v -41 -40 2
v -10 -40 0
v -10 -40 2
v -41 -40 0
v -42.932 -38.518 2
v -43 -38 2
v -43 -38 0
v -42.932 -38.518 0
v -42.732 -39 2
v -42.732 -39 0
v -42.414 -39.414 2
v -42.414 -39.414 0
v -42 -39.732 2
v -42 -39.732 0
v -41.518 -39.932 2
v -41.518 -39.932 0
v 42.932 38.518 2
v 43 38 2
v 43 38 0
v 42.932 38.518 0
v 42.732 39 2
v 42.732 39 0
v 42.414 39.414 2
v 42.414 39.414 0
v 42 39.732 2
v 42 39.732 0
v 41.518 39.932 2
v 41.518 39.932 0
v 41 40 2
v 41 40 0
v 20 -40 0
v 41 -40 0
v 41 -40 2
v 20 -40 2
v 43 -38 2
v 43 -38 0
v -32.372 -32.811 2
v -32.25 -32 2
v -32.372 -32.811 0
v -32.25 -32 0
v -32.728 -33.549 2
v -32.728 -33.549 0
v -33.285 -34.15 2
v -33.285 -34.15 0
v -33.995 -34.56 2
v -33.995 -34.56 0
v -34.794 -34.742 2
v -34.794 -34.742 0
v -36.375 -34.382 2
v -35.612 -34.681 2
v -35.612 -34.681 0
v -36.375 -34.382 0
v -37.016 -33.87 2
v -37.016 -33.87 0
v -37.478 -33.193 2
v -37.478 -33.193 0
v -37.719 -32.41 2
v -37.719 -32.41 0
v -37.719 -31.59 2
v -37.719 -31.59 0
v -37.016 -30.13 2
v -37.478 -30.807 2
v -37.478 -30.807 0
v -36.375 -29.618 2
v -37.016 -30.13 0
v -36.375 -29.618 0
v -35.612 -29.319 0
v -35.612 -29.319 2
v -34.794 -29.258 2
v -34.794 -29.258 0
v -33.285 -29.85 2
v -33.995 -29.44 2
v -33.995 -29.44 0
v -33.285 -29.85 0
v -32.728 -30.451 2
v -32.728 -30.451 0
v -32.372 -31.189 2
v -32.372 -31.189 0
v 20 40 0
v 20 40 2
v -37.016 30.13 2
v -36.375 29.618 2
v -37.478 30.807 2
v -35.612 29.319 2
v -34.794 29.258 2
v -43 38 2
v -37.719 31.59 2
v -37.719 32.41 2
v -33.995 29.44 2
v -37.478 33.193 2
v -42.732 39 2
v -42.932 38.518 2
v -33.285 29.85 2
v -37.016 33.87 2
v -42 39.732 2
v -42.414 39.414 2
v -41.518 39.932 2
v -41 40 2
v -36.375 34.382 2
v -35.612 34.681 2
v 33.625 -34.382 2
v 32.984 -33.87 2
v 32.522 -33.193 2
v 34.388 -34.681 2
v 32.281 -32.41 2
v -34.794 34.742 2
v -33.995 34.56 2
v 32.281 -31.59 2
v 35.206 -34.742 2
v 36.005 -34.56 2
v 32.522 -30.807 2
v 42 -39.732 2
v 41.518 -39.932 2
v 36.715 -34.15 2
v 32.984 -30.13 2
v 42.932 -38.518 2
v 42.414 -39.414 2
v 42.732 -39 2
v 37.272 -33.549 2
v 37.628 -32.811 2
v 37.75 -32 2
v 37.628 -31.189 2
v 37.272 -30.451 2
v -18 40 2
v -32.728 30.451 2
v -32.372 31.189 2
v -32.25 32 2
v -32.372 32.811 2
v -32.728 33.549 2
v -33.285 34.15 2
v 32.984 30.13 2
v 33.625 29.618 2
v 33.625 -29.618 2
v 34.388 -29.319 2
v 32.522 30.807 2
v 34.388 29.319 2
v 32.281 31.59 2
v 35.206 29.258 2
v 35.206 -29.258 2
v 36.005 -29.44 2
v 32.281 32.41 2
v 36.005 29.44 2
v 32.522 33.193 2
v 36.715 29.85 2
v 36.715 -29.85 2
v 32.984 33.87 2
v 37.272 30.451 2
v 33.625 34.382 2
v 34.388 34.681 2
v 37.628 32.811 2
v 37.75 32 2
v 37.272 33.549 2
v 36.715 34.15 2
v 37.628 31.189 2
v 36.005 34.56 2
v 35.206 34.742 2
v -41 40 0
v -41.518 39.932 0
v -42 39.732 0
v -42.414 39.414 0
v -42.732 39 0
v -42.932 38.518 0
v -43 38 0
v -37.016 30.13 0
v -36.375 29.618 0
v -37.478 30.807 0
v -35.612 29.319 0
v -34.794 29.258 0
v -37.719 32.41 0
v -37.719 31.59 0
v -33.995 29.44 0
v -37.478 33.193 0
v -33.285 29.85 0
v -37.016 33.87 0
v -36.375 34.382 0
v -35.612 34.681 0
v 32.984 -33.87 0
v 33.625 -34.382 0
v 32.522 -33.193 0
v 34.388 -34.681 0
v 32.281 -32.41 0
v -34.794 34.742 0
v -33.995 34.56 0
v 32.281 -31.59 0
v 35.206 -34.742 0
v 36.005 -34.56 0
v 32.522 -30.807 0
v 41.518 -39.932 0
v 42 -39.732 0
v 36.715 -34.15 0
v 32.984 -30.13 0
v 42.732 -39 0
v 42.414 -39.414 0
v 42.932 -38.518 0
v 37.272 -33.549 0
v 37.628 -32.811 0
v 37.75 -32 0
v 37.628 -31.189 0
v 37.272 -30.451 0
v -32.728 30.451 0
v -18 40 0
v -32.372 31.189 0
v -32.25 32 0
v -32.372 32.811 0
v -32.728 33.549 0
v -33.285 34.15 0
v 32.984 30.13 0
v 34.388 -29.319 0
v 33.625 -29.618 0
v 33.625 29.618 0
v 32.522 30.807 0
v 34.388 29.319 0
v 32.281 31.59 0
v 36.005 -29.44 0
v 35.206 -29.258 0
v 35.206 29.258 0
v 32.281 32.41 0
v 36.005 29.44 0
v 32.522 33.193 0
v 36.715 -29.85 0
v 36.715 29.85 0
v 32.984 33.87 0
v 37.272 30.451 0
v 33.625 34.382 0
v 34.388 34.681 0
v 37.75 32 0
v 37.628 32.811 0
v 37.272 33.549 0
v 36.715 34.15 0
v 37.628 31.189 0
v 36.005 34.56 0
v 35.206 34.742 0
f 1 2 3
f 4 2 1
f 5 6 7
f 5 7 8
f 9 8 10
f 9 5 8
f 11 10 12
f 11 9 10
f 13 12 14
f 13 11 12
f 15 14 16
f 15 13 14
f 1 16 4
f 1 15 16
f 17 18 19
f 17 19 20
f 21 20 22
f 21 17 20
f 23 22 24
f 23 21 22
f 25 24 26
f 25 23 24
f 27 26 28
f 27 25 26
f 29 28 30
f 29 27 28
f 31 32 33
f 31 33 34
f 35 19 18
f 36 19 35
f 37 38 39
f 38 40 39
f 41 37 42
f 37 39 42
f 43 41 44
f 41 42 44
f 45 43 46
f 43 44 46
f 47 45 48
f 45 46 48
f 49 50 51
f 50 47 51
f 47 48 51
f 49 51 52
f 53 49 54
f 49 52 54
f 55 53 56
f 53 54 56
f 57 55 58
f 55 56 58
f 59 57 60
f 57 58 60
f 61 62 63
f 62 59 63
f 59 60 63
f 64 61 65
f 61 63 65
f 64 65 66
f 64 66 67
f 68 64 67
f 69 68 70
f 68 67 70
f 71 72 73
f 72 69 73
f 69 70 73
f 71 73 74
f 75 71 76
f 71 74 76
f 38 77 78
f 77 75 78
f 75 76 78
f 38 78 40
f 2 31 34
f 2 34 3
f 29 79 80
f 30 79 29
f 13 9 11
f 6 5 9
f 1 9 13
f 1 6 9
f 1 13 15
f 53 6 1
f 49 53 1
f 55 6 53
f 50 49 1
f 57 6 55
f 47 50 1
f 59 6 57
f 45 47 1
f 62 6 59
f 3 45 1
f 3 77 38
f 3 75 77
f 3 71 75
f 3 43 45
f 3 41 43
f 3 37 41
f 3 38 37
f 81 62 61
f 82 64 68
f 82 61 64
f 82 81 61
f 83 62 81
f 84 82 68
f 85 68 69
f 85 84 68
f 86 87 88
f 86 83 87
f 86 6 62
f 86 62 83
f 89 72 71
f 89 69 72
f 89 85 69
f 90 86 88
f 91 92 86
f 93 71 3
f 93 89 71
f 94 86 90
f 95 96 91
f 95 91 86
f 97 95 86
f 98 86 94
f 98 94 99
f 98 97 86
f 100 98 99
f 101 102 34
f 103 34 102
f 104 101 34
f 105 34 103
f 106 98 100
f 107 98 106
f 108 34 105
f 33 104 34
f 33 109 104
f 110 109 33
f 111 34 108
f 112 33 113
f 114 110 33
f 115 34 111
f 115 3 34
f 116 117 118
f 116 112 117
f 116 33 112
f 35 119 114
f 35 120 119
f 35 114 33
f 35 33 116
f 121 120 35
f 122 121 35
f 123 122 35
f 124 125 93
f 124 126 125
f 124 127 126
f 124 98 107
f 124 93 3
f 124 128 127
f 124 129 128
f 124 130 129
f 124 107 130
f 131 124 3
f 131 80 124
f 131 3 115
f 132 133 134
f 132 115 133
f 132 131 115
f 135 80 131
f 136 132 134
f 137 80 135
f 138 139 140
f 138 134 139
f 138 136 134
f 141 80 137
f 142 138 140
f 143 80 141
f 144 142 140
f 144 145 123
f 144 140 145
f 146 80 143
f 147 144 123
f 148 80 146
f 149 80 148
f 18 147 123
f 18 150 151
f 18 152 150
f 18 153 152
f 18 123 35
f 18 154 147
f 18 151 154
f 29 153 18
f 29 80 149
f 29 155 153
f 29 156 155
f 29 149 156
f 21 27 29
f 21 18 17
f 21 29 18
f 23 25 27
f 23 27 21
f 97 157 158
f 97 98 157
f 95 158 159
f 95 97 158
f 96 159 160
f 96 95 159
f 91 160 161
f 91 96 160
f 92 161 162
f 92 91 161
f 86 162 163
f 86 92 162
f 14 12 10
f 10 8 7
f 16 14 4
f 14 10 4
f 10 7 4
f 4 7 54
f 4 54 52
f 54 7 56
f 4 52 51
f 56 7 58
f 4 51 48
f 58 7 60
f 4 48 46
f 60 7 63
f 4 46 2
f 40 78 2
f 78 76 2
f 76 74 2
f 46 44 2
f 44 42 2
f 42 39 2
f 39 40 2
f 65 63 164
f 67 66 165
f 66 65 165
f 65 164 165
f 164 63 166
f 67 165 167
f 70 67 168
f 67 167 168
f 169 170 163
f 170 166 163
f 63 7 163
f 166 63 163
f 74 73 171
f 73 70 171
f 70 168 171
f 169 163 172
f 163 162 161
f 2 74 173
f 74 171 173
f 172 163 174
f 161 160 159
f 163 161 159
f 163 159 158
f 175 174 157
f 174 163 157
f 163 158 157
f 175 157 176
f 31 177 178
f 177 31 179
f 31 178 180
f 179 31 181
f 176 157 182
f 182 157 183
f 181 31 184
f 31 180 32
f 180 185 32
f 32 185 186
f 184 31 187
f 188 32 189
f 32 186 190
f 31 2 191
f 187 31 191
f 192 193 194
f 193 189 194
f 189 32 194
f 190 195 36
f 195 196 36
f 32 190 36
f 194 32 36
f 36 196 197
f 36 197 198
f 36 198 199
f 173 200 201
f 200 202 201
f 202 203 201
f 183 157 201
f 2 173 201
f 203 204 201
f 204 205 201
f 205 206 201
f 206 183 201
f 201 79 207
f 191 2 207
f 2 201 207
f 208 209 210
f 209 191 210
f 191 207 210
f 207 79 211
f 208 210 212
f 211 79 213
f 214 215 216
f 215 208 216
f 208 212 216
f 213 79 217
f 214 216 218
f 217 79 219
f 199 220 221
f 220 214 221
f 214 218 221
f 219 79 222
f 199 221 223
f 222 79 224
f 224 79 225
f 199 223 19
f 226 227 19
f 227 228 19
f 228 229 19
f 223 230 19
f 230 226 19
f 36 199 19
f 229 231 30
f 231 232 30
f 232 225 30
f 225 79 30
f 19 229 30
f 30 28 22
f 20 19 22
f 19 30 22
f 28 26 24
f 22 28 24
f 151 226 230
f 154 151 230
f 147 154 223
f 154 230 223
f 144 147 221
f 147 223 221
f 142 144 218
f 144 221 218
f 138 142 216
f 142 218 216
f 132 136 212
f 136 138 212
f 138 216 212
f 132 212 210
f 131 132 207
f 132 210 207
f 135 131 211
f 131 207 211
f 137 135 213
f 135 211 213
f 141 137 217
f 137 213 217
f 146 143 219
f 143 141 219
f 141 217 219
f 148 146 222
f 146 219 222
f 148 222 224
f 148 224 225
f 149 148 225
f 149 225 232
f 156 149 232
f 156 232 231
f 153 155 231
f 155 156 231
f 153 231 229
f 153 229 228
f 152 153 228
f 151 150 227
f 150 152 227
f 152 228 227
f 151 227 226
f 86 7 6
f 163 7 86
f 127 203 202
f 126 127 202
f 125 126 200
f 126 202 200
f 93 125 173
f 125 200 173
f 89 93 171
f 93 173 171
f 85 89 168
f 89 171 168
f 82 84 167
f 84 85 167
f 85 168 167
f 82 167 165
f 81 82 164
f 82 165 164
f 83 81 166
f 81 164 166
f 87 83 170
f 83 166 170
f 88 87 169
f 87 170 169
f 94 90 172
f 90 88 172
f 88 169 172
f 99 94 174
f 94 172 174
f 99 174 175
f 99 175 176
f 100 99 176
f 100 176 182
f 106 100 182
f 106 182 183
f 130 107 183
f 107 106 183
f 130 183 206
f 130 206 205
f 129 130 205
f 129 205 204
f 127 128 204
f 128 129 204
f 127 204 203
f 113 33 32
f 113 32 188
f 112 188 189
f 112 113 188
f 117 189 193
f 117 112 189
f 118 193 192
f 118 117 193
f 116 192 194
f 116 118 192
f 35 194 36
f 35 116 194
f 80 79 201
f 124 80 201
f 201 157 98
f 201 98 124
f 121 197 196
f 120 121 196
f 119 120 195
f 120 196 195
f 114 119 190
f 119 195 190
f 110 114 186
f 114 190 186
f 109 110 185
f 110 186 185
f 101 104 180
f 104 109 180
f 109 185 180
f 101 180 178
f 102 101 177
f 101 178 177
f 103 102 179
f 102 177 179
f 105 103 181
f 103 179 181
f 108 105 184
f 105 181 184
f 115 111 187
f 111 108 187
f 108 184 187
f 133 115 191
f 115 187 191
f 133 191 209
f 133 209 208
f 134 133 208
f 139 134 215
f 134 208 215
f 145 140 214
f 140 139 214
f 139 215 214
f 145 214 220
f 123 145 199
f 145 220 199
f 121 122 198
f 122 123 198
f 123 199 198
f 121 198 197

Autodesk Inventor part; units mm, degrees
ref_plane "YZ Plane" through (0, 0, 0) normal (1, 0, 0) x (0, 1, 0)
ref_plane "XZ Plane" through (0, 0, 0) normal (0, 1, 0) x (-1, 0, 0)
ref_plane "XY Plane" through (0, 0, 0) normal (0, 0, 1) x (1, 0, 0)
sketch "Sketch13" plane through (0, 0, 0) normal (0, 0, 1) x (1, 0, 0)
  line L0 (-43, -40) -> (-43, 40)
  circle A0 centre (-35, 32) radius 2.75
  circle A1 centre (-35, -32) radius 2.75
  line L1 (-43, 40) -> (43, 40)
  line L2 (43, 40) -> (43, -40)
  line L3 (43, -40) -> (-43, -40)
  line L4 (0, 40) -> (0, -40) construction
  line L5 (-20, 40) -> (-20, -40) construction
  line L6 (20, 40) -> (20, -40) construction
  line L7 (-43, 0) -> (43, 0) construction
  circle A2 centre (35, 32) radius 2.75
  circle A3 centre (35, -32) radius 2.75
  line L8 (20, 40) -> (-18, 40)
  line L9 (20, -40) -> (-10, -40)
  point P0 (0, 0)
  point P1 (40, 0)
  point P2 (0, 0)
  dimension "d96" = 80
  dimension "d100" = 5.5
  dimension "d101" = 8
  dimension "d106" = 40
  dimension "d107" = 8
  dimension "d111" = 23
extrude "Plate6" add sketch "Sketch13" along normal blind 2
fillet "Fillet4" radius 2 4 edges at (43, 40, 1) (-43, 40, 1) (-43, -40, 1) (43, -40, 1)
equation "\"d108\" = Thickness"
equation "\"BendRadius\" = Thickness"
equation "\"BendReliefWidth\" = Thickness"
equation "\"BendReliefDepth\" = 0.5 * Thickness"
equation "\"CornerReliefSize\" = 4 * Thickness"
equation "\"MinimumRemnant\" = 2 * Thickness"
equation "\"TransitionRadius\" = BendRadius"
equation "\"JacobiRadiusSize\" = BendRadius"
equation "\"GapSize\" = Thickness"
equation "\"Thickness\" = 2"
properties part number "NDM 7.47 bracket floor pillar"
